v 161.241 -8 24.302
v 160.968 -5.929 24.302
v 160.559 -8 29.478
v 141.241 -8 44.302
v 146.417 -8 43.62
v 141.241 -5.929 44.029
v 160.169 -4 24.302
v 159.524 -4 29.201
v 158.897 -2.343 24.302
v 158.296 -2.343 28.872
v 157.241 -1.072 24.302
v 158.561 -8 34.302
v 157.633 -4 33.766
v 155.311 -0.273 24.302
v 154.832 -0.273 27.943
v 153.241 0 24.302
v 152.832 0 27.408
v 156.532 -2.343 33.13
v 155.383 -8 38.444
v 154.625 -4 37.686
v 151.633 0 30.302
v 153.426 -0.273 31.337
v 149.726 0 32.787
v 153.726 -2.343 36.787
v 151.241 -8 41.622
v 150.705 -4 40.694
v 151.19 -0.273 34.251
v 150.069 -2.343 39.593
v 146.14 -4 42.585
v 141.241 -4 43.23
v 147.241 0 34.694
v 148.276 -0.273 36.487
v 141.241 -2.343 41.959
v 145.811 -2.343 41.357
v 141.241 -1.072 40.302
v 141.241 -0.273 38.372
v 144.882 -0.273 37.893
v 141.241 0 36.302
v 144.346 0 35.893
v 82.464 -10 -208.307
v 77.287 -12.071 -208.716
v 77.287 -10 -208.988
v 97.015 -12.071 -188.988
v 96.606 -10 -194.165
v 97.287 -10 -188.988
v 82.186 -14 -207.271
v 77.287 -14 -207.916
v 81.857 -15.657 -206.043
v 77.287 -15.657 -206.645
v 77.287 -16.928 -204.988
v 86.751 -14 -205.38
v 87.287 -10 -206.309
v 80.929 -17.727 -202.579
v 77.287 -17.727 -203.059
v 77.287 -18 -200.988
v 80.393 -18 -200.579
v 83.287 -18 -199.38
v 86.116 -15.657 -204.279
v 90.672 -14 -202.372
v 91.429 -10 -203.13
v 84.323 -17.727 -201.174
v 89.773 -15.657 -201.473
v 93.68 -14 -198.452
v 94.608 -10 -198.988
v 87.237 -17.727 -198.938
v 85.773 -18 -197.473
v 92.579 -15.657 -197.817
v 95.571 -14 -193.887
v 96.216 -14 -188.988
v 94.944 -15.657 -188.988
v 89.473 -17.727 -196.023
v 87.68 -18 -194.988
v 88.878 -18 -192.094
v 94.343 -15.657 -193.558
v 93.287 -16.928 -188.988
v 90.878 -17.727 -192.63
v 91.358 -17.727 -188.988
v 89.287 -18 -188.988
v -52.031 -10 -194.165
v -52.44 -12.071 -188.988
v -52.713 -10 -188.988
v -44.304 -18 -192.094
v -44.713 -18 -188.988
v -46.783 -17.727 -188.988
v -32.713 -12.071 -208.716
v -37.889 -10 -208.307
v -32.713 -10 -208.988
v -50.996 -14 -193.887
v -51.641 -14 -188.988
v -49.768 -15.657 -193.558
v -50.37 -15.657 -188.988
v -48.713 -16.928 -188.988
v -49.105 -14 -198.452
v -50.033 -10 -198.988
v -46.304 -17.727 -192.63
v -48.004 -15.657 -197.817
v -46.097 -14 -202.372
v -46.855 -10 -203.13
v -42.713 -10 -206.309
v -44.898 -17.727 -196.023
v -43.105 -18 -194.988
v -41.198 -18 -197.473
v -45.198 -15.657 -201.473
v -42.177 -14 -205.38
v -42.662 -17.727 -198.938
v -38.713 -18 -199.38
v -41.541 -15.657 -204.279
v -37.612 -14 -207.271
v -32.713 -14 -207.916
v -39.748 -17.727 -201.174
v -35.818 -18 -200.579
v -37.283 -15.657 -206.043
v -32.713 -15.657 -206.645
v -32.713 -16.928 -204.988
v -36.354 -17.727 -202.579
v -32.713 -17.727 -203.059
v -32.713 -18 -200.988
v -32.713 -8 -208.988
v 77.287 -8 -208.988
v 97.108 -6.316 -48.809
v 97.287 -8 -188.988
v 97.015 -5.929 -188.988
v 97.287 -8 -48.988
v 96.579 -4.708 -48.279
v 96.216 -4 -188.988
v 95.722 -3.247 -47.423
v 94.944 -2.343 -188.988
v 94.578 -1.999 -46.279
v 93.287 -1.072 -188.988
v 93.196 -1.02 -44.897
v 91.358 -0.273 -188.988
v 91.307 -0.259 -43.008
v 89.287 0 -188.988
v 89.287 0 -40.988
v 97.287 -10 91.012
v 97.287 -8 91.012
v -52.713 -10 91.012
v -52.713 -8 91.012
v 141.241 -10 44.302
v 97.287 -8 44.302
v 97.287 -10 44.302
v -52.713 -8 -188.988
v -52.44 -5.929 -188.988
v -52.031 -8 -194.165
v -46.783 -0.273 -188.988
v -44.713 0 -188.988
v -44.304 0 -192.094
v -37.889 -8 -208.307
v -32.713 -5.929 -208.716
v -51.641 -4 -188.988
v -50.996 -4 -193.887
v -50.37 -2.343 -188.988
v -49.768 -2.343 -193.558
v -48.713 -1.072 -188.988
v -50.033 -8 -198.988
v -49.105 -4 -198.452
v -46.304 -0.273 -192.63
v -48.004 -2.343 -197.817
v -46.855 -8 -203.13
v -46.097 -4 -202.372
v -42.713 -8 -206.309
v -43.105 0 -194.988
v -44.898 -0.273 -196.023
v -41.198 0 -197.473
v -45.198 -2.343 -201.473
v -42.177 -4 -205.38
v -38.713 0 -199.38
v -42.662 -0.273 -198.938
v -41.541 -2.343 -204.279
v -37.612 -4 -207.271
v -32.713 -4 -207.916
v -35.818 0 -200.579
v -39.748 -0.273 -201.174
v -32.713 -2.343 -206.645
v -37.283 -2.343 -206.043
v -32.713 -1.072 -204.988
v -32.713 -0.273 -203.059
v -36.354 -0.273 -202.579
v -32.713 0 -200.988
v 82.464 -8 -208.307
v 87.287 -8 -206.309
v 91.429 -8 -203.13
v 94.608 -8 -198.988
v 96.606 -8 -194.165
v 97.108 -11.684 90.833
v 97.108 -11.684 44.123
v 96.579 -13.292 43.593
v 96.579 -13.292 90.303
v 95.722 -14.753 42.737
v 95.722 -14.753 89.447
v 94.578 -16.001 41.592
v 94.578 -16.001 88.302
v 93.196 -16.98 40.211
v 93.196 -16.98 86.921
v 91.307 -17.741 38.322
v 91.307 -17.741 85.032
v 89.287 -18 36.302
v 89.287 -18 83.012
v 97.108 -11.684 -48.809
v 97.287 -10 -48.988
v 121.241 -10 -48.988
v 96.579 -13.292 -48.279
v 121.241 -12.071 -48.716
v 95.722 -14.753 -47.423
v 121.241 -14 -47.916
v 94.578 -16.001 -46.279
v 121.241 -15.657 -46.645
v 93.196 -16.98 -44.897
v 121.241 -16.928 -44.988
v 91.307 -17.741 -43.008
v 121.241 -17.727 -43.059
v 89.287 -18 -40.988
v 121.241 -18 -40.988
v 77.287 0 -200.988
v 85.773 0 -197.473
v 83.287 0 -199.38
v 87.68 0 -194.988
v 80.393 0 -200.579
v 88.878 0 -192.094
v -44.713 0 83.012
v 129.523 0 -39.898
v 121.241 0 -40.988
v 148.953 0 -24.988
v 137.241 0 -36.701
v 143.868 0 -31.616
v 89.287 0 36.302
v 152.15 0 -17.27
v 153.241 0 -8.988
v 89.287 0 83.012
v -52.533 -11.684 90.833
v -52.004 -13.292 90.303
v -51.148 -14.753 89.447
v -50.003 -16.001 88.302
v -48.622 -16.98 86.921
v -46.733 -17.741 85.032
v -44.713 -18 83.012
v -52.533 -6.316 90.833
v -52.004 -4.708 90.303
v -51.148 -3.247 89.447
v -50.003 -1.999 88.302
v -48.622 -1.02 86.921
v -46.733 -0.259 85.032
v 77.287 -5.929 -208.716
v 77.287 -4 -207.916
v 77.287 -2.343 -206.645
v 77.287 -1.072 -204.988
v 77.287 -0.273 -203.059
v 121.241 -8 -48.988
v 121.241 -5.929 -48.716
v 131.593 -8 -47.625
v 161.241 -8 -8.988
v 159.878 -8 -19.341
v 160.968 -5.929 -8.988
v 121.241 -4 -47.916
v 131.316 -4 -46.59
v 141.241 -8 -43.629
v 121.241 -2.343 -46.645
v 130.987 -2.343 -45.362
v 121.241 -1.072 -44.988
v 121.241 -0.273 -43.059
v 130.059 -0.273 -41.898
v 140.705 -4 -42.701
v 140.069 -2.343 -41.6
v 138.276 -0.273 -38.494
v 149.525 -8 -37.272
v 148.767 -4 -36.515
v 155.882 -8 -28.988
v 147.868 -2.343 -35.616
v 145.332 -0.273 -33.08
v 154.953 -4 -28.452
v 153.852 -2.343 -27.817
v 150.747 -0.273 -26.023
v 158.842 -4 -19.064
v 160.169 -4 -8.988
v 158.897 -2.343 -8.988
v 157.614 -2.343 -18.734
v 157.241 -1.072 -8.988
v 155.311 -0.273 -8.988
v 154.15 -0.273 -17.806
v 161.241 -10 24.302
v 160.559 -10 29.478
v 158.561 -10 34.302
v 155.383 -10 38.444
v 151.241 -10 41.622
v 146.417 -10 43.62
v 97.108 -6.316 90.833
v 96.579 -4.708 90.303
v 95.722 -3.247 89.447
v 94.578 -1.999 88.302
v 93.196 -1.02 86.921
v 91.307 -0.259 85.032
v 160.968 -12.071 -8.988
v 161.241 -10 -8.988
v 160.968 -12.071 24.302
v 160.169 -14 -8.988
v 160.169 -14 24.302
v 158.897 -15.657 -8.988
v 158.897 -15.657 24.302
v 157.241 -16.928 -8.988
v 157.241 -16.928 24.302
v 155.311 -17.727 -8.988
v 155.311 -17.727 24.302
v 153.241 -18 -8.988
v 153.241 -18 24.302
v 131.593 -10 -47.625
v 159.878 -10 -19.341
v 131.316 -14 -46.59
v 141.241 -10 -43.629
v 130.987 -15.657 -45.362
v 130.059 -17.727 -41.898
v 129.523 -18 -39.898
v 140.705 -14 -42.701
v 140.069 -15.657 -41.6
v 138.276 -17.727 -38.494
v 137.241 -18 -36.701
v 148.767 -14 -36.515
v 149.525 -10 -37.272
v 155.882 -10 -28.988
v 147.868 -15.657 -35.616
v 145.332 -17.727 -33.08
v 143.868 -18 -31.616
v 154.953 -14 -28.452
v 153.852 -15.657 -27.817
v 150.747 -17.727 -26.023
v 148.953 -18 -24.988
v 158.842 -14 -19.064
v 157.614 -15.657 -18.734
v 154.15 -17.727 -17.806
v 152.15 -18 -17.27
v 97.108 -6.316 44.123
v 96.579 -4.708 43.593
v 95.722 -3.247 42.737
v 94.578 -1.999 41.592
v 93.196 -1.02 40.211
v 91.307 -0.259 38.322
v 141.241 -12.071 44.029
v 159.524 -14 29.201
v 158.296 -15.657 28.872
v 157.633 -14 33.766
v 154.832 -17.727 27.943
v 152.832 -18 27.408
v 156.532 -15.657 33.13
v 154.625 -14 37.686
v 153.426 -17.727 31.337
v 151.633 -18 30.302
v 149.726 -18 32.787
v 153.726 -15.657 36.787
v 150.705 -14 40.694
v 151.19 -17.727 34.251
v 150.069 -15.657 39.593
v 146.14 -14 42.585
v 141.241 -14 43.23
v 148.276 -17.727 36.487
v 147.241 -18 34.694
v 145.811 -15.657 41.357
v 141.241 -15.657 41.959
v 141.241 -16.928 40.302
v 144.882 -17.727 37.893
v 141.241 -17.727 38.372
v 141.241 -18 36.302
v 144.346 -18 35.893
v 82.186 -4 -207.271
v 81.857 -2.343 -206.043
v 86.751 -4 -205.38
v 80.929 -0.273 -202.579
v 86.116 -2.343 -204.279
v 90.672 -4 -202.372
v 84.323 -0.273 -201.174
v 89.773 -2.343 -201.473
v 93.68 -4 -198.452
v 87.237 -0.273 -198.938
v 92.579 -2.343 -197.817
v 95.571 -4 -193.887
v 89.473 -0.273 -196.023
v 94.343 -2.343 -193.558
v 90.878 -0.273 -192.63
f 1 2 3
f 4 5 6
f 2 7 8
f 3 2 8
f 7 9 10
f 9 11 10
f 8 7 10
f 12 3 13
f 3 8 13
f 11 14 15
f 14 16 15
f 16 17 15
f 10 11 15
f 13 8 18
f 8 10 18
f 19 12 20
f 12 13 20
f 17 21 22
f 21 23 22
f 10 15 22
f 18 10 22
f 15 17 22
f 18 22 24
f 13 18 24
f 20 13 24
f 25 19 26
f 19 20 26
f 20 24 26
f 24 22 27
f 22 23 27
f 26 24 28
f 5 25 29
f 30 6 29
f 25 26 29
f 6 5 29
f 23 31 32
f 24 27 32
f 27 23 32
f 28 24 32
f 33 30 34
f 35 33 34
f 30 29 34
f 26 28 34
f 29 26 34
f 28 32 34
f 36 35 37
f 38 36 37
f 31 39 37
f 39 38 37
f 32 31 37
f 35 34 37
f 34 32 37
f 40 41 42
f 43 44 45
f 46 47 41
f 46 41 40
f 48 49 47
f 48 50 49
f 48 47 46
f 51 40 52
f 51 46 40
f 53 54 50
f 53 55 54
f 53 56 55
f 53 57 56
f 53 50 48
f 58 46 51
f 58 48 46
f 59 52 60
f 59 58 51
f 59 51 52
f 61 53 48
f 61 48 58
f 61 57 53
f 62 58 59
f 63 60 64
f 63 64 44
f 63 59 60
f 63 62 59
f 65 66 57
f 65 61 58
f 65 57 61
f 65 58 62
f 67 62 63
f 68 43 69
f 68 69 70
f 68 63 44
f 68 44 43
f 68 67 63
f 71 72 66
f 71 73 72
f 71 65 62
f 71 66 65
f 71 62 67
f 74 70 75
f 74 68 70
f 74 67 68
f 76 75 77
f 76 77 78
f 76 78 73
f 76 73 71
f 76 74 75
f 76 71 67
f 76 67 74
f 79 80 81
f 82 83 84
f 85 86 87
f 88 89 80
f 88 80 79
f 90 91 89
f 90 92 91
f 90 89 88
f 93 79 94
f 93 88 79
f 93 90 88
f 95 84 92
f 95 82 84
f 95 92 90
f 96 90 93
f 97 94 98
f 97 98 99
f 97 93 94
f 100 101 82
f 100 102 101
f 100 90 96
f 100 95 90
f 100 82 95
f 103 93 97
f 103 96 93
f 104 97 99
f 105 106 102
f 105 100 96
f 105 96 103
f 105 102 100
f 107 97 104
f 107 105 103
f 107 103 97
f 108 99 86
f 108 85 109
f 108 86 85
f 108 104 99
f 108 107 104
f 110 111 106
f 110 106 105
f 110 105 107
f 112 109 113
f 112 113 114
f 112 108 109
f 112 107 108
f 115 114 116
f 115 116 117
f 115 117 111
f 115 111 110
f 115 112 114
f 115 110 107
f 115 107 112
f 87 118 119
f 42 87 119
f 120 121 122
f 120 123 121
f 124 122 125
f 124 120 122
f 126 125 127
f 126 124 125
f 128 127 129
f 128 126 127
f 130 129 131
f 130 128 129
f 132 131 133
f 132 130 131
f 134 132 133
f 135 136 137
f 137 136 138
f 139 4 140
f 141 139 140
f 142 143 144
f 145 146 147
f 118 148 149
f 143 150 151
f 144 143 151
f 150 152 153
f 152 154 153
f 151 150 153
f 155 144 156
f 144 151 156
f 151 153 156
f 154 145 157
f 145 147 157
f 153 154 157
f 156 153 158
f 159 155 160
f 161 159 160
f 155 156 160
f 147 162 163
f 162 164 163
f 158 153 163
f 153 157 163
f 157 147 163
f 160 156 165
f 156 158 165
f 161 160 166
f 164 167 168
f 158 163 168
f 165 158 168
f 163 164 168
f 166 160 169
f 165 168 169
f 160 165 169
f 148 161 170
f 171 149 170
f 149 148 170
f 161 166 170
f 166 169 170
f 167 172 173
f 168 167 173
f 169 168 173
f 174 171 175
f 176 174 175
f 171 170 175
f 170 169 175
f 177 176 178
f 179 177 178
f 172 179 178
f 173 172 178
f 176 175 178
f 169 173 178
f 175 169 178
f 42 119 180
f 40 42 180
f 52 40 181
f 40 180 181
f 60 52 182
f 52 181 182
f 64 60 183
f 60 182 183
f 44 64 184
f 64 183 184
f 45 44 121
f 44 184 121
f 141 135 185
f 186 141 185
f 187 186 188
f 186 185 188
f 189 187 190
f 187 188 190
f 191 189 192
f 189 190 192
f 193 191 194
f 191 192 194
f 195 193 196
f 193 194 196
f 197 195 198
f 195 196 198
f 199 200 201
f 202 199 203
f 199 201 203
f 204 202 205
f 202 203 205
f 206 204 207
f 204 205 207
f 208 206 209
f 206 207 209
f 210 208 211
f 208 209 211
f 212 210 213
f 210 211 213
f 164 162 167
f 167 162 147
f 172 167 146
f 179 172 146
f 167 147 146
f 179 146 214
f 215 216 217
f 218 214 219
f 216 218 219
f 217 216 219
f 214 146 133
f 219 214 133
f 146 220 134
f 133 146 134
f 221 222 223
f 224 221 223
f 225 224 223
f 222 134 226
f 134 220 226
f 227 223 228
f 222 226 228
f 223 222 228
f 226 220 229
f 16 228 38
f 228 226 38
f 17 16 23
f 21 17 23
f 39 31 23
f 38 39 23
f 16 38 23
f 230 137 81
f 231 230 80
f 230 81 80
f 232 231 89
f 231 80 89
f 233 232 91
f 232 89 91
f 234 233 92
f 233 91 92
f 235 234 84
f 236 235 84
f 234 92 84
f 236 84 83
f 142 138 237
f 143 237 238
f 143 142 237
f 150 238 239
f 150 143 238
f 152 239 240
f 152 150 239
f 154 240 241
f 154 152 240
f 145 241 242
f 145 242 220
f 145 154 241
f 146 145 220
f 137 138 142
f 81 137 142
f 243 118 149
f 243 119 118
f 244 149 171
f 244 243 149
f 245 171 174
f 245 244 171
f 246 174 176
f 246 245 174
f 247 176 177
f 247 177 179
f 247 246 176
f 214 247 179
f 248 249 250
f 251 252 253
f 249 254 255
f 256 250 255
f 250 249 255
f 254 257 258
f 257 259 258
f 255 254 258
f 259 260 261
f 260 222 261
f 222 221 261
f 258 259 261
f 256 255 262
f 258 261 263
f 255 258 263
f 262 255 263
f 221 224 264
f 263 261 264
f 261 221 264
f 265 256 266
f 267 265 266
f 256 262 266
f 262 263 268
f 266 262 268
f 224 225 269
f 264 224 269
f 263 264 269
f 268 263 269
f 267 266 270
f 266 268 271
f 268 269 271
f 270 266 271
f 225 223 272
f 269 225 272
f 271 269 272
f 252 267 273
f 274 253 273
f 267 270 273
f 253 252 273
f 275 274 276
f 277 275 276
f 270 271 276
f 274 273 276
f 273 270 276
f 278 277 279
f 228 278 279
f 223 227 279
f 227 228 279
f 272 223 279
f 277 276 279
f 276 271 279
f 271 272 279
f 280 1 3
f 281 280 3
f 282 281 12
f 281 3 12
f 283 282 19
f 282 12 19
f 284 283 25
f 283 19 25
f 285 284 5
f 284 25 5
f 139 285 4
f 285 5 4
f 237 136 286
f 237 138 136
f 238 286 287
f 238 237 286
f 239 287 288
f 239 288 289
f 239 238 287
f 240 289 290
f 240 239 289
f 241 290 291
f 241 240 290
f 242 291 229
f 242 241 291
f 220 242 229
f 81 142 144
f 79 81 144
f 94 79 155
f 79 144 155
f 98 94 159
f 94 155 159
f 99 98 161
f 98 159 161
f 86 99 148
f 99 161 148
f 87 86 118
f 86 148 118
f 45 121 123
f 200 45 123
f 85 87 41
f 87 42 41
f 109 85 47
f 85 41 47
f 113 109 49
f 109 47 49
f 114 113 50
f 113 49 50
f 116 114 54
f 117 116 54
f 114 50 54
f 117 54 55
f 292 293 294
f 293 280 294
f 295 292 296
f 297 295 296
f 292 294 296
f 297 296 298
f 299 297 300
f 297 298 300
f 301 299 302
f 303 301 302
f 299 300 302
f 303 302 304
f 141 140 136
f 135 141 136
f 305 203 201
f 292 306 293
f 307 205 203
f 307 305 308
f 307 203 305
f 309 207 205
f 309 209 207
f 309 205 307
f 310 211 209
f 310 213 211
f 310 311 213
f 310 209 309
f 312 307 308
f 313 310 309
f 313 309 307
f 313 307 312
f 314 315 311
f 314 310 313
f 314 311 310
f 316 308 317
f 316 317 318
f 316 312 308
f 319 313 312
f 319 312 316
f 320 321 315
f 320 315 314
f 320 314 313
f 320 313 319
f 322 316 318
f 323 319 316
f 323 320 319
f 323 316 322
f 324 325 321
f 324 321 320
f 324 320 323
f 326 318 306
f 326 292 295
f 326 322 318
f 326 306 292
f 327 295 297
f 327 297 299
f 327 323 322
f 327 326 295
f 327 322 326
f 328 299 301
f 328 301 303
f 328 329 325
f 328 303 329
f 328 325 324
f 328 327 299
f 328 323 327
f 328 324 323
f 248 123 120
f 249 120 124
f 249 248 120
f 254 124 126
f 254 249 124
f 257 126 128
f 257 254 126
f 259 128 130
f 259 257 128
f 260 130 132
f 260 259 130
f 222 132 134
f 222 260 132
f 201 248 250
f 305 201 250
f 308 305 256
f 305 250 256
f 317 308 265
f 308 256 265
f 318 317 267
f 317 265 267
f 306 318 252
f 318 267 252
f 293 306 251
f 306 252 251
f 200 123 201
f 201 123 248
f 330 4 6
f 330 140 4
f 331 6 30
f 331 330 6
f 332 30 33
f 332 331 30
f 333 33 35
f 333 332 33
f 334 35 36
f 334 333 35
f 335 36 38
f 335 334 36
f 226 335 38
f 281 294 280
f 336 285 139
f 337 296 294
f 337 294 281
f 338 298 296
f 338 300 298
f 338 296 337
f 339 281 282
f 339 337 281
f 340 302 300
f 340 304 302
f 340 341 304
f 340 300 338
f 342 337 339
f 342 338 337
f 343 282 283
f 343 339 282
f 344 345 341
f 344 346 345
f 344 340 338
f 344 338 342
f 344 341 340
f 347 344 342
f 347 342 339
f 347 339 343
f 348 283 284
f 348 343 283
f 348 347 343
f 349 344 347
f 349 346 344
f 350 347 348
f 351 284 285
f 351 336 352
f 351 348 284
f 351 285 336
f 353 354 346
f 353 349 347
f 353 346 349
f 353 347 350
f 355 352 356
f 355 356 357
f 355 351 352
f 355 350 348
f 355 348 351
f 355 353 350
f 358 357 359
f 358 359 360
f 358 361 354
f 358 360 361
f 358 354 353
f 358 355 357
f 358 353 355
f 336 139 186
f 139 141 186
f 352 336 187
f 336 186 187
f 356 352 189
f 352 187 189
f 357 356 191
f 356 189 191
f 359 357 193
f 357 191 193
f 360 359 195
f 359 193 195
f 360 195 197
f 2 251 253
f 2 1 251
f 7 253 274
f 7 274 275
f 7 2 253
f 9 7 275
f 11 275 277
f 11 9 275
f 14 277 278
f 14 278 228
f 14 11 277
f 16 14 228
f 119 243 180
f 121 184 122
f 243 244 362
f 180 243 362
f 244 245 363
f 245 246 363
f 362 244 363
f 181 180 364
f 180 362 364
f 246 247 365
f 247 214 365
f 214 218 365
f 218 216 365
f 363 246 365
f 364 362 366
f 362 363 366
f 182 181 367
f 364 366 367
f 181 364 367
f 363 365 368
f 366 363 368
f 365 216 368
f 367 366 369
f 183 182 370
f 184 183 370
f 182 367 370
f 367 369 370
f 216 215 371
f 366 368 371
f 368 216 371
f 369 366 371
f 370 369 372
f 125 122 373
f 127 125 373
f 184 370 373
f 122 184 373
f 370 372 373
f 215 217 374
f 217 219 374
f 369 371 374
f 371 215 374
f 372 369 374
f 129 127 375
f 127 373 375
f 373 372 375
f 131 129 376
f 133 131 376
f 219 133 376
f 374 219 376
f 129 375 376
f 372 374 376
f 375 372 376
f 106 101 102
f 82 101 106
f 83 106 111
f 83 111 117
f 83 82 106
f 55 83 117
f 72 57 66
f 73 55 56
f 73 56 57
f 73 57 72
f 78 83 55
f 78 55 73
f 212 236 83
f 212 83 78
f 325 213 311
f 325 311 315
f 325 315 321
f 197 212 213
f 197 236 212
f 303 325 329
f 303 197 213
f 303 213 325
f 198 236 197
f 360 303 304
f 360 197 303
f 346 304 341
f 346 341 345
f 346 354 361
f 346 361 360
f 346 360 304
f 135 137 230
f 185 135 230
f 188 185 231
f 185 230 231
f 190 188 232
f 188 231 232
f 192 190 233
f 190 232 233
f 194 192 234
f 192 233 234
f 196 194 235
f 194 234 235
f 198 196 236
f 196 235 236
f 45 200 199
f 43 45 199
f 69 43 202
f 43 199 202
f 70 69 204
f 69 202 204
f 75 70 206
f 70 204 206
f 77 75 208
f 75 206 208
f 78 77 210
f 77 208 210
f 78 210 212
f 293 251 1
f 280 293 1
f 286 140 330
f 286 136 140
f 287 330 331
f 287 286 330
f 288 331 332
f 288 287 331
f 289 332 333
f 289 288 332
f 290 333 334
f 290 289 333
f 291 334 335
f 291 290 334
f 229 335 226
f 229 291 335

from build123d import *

# Parameters (mm, degrees)
F1_DEPTH = 18
F2_R     = 8


with BuildPart() as f1:
    # F0 (on Front) → F1 (new body)
    with BuildSketch(Plane.XZ):
        with BuildLine():
            ThreePointArc((-57.712653, -188.988174), (-51.854789, -203.130309), (-37.712653, -208.988174))
            Line((-37.712653, -208.988174), (72.287347, -208.988174))
            ThreePointArc((72.287347, -208.988174), (86.429482, -203.130309), (92.287347, -188.988174))
            Line((92.287347, -188.988174), (92.287347, -48.988174))
            Line((92.287347, -48.988174), (92.287347, 44.301756))
            Line((92.287347, 44.301756), (92.287347, 91.011826))
            Line((92.287347, 91.011826), (-57.712653, 91.011826))
            Line((-57.712653, 91.011826), (-57.712653, -188.988174))
        make_face()
        with BuildLine():
            Line((92.287347, 44.301756), (92.287347, -48.988174))
            Line((92.287347, -48.988174), (116.240627, -48.988174))
            ThreePointArc((116.240627, -48.988174), (144.524898, -37.272445), (156.240627, -8.988174))
            Line((156.240627, -8.988174), (156.240627, 24.301756))
            ThreePointArc((156.240627, 24.301756), (150.382763, 38.443891), (136.240627, 44.301756))
            Line((136.240627, 44.301756), (92.287347, 44.301756))
        make_face()
    extrude(amount=F1_DEPTH)

    # F2
    f2_edges = [f1.edges().sort_by_distance(p)[0] for p in [
        (-57.712653, -18, -48.988174),
        (-57.712653, 0, -48.988174),
        (17.287347, -18, 91.011826),
        (17.287347, 0, 91.011826),
        (92.287347, -18, 67.656791),
        (92.287347, 0, 67.656791),
        (114.263987, 0, 44.301756),
        (114.263987, -18, 44.301756),
        (150.382763, 0, 38.443891),
    ]]
    fillet(f2_edges, radius=F2_R)


with BuildPart() as f1_1:
    # F3: moved
    add(f1.part.moved(Location((5, 0, 0))))


solid = f1_1.part
